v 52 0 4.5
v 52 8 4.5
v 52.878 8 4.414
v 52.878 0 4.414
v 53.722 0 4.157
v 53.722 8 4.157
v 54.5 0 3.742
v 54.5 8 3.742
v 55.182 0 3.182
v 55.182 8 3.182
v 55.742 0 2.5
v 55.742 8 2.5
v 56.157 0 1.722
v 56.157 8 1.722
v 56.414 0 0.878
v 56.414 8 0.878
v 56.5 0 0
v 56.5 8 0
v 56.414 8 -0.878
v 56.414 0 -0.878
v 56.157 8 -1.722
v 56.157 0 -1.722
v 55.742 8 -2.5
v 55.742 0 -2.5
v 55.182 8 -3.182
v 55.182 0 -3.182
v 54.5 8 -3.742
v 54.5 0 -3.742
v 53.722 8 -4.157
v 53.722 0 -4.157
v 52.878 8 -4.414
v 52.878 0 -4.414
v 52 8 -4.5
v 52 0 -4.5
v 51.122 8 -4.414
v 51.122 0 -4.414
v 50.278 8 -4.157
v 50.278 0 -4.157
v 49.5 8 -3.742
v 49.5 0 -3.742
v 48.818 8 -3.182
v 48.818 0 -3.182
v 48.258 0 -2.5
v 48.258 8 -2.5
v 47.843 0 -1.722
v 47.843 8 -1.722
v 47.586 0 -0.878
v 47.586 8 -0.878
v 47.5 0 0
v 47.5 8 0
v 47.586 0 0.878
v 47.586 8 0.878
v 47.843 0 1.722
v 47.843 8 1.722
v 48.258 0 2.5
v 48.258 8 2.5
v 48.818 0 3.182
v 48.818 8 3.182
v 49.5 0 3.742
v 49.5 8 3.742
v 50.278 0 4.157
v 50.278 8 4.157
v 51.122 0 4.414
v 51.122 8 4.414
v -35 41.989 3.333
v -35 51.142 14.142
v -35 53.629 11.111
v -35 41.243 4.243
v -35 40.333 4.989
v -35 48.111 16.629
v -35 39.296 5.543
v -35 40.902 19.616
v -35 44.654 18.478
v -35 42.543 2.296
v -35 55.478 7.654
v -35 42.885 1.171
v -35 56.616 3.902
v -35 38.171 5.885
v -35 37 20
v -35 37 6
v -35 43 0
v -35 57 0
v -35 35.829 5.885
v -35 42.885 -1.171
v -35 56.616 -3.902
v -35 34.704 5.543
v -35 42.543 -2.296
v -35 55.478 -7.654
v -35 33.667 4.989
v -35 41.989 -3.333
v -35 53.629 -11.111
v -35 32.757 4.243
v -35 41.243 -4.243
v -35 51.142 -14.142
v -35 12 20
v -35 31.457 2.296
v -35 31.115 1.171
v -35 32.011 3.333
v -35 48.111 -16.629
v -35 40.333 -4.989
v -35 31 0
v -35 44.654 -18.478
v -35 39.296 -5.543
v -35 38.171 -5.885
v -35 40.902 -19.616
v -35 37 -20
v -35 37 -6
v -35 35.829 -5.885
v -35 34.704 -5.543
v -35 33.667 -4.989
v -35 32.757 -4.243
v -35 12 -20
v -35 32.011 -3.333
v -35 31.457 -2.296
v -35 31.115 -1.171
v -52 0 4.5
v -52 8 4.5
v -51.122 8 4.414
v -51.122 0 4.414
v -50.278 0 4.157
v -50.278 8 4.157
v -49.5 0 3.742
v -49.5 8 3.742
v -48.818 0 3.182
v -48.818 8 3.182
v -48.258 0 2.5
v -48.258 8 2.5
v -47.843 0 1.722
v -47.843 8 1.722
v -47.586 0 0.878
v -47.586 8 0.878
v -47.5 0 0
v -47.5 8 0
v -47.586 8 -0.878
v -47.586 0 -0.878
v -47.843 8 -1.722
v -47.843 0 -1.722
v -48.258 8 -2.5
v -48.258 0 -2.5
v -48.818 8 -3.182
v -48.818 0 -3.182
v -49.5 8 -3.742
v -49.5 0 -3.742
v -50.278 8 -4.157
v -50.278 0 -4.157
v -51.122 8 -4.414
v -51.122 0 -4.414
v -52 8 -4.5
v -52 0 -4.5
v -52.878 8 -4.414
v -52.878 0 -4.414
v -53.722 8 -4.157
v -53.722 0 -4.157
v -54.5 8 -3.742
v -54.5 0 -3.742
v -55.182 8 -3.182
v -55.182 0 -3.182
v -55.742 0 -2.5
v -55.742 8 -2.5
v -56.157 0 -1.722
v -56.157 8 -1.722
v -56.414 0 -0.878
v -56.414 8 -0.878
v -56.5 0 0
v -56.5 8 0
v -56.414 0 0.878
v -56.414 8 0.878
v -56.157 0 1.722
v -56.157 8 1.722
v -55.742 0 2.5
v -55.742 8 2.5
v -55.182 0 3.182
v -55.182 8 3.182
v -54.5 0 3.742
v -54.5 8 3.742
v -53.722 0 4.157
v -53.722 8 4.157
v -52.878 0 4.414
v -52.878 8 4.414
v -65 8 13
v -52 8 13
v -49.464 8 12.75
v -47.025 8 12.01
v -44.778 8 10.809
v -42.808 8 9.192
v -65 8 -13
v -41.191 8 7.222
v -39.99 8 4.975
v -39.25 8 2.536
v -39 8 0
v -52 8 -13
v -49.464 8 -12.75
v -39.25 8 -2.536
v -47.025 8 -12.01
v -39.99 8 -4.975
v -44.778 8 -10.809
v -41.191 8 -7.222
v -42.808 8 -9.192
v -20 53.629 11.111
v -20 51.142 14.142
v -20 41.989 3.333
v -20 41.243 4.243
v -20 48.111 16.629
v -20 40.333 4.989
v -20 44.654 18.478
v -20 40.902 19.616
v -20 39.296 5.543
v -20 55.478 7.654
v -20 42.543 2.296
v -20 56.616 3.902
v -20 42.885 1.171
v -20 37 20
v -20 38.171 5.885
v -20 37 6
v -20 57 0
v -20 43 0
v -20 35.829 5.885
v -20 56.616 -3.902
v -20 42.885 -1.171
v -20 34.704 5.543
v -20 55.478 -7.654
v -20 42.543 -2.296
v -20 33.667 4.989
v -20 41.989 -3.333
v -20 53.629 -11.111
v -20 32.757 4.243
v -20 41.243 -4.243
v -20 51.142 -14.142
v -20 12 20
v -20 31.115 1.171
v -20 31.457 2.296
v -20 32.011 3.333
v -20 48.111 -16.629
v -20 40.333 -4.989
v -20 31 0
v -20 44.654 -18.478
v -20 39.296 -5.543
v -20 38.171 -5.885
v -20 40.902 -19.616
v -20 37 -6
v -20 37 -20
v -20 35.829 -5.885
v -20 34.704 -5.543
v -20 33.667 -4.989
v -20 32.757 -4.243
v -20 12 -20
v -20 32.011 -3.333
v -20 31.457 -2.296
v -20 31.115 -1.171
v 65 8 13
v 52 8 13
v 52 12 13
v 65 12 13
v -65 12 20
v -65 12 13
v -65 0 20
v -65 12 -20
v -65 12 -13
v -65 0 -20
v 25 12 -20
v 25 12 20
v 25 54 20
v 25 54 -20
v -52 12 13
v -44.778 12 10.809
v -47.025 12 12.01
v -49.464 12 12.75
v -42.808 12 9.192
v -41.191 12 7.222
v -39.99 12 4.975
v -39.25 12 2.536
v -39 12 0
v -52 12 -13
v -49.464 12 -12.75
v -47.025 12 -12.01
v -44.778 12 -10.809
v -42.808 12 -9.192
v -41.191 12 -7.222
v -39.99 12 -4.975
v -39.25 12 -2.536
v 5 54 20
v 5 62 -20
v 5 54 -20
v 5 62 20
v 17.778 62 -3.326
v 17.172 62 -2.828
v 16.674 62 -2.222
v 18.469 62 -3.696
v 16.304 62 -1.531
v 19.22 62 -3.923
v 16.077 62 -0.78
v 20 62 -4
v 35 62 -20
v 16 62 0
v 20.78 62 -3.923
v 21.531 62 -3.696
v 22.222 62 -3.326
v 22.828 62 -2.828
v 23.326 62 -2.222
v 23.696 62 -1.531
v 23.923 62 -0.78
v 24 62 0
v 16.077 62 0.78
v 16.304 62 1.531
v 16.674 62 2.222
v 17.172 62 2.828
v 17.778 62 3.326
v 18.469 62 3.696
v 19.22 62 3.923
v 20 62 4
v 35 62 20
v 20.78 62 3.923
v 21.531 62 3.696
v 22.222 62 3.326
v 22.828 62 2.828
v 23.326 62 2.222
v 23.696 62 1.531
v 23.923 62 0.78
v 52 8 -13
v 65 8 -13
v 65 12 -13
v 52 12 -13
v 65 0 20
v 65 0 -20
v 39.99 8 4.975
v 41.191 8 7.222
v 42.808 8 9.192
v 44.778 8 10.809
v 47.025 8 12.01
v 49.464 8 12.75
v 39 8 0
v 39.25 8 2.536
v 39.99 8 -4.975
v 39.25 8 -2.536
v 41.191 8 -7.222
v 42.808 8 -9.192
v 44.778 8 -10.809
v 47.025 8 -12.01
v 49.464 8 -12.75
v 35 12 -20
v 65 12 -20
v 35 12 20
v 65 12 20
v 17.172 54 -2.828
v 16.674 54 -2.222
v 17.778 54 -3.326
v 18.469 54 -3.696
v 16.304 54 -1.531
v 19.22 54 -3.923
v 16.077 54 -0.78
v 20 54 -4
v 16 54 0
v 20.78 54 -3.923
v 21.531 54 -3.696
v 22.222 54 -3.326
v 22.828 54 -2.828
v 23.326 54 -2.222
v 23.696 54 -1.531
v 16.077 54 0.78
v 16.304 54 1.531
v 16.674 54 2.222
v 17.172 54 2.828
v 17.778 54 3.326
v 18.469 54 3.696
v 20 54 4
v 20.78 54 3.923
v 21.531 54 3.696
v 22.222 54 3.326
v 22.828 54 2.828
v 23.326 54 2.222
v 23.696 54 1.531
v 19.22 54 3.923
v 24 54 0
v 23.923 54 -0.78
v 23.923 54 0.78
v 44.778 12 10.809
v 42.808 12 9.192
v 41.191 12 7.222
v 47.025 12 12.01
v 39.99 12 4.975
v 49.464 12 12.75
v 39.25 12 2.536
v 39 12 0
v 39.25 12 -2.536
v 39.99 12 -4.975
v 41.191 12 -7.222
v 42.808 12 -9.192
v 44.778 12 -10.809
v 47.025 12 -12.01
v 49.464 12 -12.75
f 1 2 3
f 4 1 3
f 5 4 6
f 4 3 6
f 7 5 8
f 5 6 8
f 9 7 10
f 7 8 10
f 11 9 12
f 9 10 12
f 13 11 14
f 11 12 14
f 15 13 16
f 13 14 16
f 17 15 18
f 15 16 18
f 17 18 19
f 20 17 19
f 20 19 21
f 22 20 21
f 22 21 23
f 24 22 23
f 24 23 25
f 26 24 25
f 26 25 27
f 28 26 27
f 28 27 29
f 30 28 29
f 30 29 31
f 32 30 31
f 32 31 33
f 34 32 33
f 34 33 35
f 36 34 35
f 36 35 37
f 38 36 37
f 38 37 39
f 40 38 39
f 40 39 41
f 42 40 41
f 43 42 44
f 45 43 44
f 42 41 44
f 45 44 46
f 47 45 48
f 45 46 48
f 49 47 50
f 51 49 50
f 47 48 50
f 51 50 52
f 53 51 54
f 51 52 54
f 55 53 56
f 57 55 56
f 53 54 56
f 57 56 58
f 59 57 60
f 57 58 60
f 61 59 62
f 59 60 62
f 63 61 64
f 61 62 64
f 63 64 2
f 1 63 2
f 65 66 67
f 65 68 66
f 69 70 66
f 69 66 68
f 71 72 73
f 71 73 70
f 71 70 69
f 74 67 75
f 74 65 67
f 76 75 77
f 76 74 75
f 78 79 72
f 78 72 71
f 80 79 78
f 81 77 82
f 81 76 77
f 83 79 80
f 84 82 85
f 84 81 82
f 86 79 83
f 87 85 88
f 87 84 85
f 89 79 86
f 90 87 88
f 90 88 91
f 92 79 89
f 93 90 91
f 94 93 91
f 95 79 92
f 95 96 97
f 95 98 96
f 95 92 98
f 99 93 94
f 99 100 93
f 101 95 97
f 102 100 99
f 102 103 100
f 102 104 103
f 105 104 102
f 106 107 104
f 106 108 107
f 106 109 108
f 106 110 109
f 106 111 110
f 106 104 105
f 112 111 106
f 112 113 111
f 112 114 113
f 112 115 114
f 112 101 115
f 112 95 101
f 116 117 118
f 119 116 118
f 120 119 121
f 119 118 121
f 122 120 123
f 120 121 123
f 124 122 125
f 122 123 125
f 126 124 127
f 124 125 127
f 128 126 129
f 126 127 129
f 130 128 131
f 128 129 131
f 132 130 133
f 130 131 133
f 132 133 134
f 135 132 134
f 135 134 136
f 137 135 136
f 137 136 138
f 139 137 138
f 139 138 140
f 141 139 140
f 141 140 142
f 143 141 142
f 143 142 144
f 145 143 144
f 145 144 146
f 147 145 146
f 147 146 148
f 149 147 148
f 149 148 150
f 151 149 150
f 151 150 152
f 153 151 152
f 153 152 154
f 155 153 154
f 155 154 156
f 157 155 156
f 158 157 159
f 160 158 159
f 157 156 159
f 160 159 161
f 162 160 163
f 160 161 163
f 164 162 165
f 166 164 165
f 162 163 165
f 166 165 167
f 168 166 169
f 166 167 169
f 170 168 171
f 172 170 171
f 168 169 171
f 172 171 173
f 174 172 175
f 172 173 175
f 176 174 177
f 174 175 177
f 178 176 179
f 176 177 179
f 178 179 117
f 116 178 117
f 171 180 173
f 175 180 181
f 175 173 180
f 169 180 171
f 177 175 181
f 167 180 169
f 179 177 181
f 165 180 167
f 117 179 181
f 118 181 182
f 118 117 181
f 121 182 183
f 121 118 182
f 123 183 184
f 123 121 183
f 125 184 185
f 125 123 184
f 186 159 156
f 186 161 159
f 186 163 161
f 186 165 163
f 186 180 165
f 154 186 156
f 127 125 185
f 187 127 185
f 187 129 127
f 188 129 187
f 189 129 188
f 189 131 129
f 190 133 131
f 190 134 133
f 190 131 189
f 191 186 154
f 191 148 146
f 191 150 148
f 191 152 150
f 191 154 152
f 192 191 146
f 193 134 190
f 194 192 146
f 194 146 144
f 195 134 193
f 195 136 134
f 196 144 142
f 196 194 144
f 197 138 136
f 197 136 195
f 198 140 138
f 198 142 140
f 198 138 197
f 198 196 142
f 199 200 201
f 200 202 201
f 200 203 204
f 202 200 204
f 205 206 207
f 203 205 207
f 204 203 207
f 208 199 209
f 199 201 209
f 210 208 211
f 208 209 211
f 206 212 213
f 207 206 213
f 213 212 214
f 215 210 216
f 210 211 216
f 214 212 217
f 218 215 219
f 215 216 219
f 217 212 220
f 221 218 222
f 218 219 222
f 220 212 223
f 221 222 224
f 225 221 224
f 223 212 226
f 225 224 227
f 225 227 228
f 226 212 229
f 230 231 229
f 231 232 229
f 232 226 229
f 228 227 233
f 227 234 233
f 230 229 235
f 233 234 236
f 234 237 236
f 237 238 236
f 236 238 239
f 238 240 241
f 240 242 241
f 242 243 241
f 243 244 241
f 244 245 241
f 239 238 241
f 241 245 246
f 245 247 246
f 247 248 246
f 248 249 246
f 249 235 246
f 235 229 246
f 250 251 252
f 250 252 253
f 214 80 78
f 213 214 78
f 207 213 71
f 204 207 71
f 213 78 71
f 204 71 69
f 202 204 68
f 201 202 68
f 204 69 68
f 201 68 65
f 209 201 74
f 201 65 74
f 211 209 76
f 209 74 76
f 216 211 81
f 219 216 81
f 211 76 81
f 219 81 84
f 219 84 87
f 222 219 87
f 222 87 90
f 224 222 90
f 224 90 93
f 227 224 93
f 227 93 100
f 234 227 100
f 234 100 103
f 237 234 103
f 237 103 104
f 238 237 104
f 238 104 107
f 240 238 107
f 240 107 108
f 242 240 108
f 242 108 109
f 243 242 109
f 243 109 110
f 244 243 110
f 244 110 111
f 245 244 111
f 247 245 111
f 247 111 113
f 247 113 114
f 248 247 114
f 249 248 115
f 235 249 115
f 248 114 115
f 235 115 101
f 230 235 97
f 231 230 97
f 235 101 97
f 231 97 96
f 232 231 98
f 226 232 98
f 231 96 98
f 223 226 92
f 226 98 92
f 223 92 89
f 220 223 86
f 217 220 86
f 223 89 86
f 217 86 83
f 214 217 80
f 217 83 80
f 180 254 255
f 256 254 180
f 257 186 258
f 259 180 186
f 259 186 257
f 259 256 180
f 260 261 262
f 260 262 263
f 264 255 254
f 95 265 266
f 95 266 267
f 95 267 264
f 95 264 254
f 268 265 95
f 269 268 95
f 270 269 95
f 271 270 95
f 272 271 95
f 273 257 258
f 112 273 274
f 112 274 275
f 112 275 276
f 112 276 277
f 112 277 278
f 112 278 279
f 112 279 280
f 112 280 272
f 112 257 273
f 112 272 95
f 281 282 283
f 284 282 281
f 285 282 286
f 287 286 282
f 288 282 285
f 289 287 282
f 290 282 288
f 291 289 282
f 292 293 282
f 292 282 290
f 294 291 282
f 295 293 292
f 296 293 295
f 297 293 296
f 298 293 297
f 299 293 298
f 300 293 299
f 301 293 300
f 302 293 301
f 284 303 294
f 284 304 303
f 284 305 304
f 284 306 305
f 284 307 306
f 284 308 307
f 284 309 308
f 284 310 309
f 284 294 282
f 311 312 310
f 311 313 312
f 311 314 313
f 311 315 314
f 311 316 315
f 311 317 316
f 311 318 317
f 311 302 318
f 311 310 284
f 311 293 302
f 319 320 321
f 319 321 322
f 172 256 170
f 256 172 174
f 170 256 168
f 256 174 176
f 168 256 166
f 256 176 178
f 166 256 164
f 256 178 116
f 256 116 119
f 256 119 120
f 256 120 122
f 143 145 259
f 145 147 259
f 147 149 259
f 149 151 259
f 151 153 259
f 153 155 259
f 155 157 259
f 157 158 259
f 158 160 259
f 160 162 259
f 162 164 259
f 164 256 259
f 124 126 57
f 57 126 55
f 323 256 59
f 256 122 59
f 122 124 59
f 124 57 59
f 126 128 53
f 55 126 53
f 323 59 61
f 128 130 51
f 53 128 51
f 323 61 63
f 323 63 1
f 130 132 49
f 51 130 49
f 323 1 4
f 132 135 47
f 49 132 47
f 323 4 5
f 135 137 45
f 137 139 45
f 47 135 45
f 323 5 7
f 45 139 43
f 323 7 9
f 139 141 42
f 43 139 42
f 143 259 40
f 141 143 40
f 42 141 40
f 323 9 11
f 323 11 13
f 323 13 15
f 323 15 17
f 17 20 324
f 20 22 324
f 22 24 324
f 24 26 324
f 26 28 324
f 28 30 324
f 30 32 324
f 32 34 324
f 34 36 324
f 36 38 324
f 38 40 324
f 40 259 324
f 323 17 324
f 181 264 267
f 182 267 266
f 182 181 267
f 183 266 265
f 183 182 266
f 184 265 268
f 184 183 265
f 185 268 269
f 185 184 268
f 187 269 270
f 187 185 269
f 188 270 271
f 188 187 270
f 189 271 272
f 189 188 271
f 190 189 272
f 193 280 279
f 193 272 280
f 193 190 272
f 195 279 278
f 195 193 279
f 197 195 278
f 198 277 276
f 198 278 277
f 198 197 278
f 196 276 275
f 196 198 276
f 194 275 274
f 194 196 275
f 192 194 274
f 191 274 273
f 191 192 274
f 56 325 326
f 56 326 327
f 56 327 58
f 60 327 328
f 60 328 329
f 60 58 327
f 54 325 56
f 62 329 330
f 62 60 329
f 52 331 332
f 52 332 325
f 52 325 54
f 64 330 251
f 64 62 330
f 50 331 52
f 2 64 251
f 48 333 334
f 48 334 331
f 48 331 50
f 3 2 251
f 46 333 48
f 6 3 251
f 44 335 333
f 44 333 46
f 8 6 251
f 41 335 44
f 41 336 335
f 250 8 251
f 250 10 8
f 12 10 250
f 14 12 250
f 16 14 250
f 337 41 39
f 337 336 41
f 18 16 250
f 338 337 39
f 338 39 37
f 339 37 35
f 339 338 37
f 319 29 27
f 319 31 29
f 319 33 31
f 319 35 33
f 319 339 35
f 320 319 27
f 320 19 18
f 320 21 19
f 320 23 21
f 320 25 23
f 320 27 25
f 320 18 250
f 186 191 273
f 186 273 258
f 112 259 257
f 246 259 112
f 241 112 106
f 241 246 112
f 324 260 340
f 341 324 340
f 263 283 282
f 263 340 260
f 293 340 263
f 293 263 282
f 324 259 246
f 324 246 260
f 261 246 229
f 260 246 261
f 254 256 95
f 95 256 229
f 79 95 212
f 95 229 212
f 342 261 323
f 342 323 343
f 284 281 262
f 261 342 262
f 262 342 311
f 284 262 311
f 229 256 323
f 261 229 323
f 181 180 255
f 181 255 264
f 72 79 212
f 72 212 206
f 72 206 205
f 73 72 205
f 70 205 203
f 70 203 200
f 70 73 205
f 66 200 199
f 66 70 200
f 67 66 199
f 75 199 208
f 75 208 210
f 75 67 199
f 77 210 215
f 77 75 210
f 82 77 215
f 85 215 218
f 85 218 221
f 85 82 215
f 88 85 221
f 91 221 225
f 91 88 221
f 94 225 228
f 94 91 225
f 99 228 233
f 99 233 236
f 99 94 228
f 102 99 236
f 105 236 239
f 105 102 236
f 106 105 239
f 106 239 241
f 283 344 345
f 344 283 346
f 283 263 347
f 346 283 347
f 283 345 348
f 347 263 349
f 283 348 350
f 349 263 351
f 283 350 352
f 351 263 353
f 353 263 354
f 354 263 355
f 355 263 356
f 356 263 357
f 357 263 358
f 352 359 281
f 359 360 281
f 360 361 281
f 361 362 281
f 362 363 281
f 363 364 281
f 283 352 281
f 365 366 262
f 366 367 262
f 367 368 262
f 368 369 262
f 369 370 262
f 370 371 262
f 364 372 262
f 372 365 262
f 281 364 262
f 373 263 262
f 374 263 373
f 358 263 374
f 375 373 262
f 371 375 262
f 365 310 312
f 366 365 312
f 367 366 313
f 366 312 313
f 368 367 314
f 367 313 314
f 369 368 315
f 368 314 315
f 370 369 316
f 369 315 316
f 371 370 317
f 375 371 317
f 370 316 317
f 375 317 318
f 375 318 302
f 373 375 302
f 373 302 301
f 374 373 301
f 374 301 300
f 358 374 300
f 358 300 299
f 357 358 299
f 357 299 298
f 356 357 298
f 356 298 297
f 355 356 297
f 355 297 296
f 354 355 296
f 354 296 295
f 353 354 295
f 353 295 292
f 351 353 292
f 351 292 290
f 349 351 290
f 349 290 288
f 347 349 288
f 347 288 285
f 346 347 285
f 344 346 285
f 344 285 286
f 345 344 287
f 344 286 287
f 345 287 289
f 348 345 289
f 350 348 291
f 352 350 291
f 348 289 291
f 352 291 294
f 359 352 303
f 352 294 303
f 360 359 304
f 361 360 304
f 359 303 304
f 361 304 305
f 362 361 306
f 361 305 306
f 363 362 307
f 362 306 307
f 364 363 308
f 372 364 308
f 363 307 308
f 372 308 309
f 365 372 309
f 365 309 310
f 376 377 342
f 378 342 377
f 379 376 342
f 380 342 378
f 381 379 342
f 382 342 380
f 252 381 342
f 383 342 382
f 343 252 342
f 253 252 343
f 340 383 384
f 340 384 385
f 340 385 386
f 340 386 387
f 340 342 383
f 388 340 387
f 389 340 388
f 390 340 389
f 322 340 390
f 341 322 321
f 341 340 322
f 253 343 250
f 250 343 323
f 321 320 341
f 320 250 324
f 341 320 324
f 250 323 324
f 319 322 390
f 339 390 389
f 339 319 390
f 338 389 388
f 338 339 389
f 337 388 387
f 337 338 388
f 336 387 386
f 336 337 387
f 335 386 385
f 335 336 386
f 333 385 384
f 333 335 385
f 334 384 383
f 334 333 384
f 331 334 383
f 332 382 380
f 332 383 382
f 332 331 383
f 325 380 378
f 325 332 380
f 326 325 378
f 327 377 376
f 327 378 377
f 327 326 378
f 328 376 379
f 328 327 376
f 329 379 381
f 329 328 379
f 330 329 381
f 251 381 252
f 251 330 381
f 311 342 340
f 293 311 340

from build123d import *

# Parameters (mm, degrees)
ESBO_O1_W                  = 130
ESBO_O1_H                  = 40
RESSALTO_EXTRUS_O1_DEPTH   = 12
CORTE_EXTRUS_O3_DEPTH      = 70.057946682
CORTE_EXTRUS_O3_DEPTH_BACK = 4
CORTE_EXTRUS_O4_DEPTH      = 70.057946682
CORTE_EXTRUS_O4_DEPTH_BACK = 4
ESBO_O5_R                  = 4.5
CORTE_EXTRUS_O5_DEPTH      = 69.476273263
ESBO_O7_W                  = 15
ESBO_O7_H                  = 40
RESSALTO_EXTRUS_O2_DEPTH   = 50
ESBO_O8_W                  = 10
ESBO_O8_H                  = 40
RESSALTO_EXTRUS_O3_DEPTH   = 50
ESBO_O9_W                  = 40
ESBO_O9_H                  = 8
RESSALTO_EXTRUS_O4_DEPTH   = 20
ESBO_O10_R                 = 4
CORTE_EXTRUS_O6_DEPTH      = 20
CORTE_EXTRUS_O7_DEPTH      = 20
ESBO_O12_R                 = 6
CORTE_EXTRUS_O8_DEPTH      = 20


with BuildPart() as part:
    # Esboço1 → Ressalto-extrusão1 (new body)
    with BuildSketch(Plane(origin=(0, 0, 0), x_dir=(1, 0, 0), z_dir=(0, 1, 0))):
        Rectangle(ESBO_O1_W, ESBO_O1_H)
    extrude(amount=RESSALTO_EXTRUS_O1_DEPTH)

    # Esboço3 → Corte-extrusão3 (cut, two sides: drawn at the far end of the back side and taken through both)
    with BuildSketch(Plane(origin=(0, 12, 0), x_dir=(1, 0, 0), z_dir=(0, 1, 0)).offset(-CORTE_EXTRUS_O3_DEPTH_BACK)):
        with BuildLine():
            Line((-52, 13), (-65, 13))
            Line((-65, 13), (-65, -13))
            Line((-65, -13), (-52, -13))
            ThreePointArc((-52, -13), (-39, 0), (-52, 13))
        make_face()
    extrude(amount=CORTE_EXTRUS_O3_DEPTH + CORTE_EXTRUS_O3_DEPTH_BACK, mode=Mode.SUBTRACT)

    # Esboço4 → Corte-extrusão4 (cut, two sides: drawn at the far end of the back side and taken through both)
    with BuildSketch(Plane(origin=(0, 12, 0), x_dir=(1, 0, 0), z_dir=(0, 1, 0)).offset(-CORTE_EXTRUS_O4_DEPTH_BACK)):
        with BuildLine():
            Line((343.246155611, 13), (65, 13))
            Line((65, 13), (52, 13))
            ThreePointArc((52, 13), (39, 0), (52, -13))
            Line((52, -13), (65, -13))
            Line((65, -13), (343.246155611, -13))
            Line((343.246155611, -13), (899.738466833, -13))
            Line((899.738466833, -13), (899.738466833, 13))
            Line((899.738466833, 13), (343.246155611, 13))
        make_face()
    extrude(amount=CORTE_EXTRUS_O4_DEPTH + CORTE_EXTRUS_O4_DEPTH_BACK, mode=Mode.SUBTRACT)

    # Esboço5 → Corte-extrusão5 (cut, through all)
    with BuildSketch(Plane(origin=(0, 8, 0), x_dir=(1, 0, 0), z_dir=(0, 1, 0))):
        with Locations(Location((-52, 0, 0), (0, 0, 270))):
            Circle(ESBO_O5_R)
        with Locations(Location((52, 0, 0), (0, 0, 270))):
            Circle(ESBO_O5_R)
    extrude(amount=-CORTE_EXTRUS_O5_DEPTH, mode=Mode.SUBTRACT)

    # Esboço7 → Ressalto-extrusão2 (add)
    with BuildSketch(Plane(origin=(0, 12, 0), x_dir=(1, 0, 0), z_dir=(0, 1, 0))):
        with Locations((-27.5, 0)):
            Rectangle(ESBO_O7_W, ESBO_O7_H)
    extrude(amount=RESSALTO_EXTRUS_O2_DEPTH)

    # Esboço8 → Ressalto-extrusão3 (add)
    with BuildSketch(Plane(origin=(0, 12, 0), x_dir=(1, 0, 0), z_dir=(0, 1, 0))):
        with Locations((30, 0)):
            Rectangle(ESBO_O8_W, ESBO_O8_H)
    extrude(amount=RESSALTO_EXTRUS_O3_DEPTH)

    # Esboço9 → Ressalto-extrusão4 (add)
    with BuildSketch(Plane.ZY.offset(-25)):
        with Locations((0, 58)):
            Rectangle(ESBO_O9_W, ESBO_O9_H)
    extrude(amount=RESSALTO_EXTRUS_O4_DEPTH)

    # Esboço10 → Corte-extrusão6 (cut)
    with BuildSketch(Plane(origin=(0, 62, 0), x_dir=(1, 0, 0), z_dir=(0, 1, 0))):
        with Locations(Location((20, 0, 0), (0, 0, 270))):
            Circle(ESBO_O10_R)
    extrude(amount=-CORTE_EXTRUS_O6_DEPTH, mode=Mode.SUBTRACT)

    # Esboço11 → Corte-extrusão7 (cut)
    with BuildSketch(Plane.ZY.offset(35)):
        with BuildLine():
            Line((-20, 37), (-20, 62))
            Line((-20, 62), (20, 62))
            Line((20, 62), (20, 37))
            ThreePointArc((20, 37), (0, 57), (-20, 37))
        make_face()
    extrude(amount=-CORTE_EXTRUS_O7_DEPTH, mode=Mode.SUBTRACT)

    # Esboço12 → Corte-extrusão8 (cut)
    with BuildSketch(Plane.ZY.offset(35)):
        with Locations((0, 37)):
            Circle(ESBO_O12_R)
    extrude(amount=-CORTE_EXTRUS_O8_DEPTH, mode=Mode.SUBTRACT)


solid = part.part
